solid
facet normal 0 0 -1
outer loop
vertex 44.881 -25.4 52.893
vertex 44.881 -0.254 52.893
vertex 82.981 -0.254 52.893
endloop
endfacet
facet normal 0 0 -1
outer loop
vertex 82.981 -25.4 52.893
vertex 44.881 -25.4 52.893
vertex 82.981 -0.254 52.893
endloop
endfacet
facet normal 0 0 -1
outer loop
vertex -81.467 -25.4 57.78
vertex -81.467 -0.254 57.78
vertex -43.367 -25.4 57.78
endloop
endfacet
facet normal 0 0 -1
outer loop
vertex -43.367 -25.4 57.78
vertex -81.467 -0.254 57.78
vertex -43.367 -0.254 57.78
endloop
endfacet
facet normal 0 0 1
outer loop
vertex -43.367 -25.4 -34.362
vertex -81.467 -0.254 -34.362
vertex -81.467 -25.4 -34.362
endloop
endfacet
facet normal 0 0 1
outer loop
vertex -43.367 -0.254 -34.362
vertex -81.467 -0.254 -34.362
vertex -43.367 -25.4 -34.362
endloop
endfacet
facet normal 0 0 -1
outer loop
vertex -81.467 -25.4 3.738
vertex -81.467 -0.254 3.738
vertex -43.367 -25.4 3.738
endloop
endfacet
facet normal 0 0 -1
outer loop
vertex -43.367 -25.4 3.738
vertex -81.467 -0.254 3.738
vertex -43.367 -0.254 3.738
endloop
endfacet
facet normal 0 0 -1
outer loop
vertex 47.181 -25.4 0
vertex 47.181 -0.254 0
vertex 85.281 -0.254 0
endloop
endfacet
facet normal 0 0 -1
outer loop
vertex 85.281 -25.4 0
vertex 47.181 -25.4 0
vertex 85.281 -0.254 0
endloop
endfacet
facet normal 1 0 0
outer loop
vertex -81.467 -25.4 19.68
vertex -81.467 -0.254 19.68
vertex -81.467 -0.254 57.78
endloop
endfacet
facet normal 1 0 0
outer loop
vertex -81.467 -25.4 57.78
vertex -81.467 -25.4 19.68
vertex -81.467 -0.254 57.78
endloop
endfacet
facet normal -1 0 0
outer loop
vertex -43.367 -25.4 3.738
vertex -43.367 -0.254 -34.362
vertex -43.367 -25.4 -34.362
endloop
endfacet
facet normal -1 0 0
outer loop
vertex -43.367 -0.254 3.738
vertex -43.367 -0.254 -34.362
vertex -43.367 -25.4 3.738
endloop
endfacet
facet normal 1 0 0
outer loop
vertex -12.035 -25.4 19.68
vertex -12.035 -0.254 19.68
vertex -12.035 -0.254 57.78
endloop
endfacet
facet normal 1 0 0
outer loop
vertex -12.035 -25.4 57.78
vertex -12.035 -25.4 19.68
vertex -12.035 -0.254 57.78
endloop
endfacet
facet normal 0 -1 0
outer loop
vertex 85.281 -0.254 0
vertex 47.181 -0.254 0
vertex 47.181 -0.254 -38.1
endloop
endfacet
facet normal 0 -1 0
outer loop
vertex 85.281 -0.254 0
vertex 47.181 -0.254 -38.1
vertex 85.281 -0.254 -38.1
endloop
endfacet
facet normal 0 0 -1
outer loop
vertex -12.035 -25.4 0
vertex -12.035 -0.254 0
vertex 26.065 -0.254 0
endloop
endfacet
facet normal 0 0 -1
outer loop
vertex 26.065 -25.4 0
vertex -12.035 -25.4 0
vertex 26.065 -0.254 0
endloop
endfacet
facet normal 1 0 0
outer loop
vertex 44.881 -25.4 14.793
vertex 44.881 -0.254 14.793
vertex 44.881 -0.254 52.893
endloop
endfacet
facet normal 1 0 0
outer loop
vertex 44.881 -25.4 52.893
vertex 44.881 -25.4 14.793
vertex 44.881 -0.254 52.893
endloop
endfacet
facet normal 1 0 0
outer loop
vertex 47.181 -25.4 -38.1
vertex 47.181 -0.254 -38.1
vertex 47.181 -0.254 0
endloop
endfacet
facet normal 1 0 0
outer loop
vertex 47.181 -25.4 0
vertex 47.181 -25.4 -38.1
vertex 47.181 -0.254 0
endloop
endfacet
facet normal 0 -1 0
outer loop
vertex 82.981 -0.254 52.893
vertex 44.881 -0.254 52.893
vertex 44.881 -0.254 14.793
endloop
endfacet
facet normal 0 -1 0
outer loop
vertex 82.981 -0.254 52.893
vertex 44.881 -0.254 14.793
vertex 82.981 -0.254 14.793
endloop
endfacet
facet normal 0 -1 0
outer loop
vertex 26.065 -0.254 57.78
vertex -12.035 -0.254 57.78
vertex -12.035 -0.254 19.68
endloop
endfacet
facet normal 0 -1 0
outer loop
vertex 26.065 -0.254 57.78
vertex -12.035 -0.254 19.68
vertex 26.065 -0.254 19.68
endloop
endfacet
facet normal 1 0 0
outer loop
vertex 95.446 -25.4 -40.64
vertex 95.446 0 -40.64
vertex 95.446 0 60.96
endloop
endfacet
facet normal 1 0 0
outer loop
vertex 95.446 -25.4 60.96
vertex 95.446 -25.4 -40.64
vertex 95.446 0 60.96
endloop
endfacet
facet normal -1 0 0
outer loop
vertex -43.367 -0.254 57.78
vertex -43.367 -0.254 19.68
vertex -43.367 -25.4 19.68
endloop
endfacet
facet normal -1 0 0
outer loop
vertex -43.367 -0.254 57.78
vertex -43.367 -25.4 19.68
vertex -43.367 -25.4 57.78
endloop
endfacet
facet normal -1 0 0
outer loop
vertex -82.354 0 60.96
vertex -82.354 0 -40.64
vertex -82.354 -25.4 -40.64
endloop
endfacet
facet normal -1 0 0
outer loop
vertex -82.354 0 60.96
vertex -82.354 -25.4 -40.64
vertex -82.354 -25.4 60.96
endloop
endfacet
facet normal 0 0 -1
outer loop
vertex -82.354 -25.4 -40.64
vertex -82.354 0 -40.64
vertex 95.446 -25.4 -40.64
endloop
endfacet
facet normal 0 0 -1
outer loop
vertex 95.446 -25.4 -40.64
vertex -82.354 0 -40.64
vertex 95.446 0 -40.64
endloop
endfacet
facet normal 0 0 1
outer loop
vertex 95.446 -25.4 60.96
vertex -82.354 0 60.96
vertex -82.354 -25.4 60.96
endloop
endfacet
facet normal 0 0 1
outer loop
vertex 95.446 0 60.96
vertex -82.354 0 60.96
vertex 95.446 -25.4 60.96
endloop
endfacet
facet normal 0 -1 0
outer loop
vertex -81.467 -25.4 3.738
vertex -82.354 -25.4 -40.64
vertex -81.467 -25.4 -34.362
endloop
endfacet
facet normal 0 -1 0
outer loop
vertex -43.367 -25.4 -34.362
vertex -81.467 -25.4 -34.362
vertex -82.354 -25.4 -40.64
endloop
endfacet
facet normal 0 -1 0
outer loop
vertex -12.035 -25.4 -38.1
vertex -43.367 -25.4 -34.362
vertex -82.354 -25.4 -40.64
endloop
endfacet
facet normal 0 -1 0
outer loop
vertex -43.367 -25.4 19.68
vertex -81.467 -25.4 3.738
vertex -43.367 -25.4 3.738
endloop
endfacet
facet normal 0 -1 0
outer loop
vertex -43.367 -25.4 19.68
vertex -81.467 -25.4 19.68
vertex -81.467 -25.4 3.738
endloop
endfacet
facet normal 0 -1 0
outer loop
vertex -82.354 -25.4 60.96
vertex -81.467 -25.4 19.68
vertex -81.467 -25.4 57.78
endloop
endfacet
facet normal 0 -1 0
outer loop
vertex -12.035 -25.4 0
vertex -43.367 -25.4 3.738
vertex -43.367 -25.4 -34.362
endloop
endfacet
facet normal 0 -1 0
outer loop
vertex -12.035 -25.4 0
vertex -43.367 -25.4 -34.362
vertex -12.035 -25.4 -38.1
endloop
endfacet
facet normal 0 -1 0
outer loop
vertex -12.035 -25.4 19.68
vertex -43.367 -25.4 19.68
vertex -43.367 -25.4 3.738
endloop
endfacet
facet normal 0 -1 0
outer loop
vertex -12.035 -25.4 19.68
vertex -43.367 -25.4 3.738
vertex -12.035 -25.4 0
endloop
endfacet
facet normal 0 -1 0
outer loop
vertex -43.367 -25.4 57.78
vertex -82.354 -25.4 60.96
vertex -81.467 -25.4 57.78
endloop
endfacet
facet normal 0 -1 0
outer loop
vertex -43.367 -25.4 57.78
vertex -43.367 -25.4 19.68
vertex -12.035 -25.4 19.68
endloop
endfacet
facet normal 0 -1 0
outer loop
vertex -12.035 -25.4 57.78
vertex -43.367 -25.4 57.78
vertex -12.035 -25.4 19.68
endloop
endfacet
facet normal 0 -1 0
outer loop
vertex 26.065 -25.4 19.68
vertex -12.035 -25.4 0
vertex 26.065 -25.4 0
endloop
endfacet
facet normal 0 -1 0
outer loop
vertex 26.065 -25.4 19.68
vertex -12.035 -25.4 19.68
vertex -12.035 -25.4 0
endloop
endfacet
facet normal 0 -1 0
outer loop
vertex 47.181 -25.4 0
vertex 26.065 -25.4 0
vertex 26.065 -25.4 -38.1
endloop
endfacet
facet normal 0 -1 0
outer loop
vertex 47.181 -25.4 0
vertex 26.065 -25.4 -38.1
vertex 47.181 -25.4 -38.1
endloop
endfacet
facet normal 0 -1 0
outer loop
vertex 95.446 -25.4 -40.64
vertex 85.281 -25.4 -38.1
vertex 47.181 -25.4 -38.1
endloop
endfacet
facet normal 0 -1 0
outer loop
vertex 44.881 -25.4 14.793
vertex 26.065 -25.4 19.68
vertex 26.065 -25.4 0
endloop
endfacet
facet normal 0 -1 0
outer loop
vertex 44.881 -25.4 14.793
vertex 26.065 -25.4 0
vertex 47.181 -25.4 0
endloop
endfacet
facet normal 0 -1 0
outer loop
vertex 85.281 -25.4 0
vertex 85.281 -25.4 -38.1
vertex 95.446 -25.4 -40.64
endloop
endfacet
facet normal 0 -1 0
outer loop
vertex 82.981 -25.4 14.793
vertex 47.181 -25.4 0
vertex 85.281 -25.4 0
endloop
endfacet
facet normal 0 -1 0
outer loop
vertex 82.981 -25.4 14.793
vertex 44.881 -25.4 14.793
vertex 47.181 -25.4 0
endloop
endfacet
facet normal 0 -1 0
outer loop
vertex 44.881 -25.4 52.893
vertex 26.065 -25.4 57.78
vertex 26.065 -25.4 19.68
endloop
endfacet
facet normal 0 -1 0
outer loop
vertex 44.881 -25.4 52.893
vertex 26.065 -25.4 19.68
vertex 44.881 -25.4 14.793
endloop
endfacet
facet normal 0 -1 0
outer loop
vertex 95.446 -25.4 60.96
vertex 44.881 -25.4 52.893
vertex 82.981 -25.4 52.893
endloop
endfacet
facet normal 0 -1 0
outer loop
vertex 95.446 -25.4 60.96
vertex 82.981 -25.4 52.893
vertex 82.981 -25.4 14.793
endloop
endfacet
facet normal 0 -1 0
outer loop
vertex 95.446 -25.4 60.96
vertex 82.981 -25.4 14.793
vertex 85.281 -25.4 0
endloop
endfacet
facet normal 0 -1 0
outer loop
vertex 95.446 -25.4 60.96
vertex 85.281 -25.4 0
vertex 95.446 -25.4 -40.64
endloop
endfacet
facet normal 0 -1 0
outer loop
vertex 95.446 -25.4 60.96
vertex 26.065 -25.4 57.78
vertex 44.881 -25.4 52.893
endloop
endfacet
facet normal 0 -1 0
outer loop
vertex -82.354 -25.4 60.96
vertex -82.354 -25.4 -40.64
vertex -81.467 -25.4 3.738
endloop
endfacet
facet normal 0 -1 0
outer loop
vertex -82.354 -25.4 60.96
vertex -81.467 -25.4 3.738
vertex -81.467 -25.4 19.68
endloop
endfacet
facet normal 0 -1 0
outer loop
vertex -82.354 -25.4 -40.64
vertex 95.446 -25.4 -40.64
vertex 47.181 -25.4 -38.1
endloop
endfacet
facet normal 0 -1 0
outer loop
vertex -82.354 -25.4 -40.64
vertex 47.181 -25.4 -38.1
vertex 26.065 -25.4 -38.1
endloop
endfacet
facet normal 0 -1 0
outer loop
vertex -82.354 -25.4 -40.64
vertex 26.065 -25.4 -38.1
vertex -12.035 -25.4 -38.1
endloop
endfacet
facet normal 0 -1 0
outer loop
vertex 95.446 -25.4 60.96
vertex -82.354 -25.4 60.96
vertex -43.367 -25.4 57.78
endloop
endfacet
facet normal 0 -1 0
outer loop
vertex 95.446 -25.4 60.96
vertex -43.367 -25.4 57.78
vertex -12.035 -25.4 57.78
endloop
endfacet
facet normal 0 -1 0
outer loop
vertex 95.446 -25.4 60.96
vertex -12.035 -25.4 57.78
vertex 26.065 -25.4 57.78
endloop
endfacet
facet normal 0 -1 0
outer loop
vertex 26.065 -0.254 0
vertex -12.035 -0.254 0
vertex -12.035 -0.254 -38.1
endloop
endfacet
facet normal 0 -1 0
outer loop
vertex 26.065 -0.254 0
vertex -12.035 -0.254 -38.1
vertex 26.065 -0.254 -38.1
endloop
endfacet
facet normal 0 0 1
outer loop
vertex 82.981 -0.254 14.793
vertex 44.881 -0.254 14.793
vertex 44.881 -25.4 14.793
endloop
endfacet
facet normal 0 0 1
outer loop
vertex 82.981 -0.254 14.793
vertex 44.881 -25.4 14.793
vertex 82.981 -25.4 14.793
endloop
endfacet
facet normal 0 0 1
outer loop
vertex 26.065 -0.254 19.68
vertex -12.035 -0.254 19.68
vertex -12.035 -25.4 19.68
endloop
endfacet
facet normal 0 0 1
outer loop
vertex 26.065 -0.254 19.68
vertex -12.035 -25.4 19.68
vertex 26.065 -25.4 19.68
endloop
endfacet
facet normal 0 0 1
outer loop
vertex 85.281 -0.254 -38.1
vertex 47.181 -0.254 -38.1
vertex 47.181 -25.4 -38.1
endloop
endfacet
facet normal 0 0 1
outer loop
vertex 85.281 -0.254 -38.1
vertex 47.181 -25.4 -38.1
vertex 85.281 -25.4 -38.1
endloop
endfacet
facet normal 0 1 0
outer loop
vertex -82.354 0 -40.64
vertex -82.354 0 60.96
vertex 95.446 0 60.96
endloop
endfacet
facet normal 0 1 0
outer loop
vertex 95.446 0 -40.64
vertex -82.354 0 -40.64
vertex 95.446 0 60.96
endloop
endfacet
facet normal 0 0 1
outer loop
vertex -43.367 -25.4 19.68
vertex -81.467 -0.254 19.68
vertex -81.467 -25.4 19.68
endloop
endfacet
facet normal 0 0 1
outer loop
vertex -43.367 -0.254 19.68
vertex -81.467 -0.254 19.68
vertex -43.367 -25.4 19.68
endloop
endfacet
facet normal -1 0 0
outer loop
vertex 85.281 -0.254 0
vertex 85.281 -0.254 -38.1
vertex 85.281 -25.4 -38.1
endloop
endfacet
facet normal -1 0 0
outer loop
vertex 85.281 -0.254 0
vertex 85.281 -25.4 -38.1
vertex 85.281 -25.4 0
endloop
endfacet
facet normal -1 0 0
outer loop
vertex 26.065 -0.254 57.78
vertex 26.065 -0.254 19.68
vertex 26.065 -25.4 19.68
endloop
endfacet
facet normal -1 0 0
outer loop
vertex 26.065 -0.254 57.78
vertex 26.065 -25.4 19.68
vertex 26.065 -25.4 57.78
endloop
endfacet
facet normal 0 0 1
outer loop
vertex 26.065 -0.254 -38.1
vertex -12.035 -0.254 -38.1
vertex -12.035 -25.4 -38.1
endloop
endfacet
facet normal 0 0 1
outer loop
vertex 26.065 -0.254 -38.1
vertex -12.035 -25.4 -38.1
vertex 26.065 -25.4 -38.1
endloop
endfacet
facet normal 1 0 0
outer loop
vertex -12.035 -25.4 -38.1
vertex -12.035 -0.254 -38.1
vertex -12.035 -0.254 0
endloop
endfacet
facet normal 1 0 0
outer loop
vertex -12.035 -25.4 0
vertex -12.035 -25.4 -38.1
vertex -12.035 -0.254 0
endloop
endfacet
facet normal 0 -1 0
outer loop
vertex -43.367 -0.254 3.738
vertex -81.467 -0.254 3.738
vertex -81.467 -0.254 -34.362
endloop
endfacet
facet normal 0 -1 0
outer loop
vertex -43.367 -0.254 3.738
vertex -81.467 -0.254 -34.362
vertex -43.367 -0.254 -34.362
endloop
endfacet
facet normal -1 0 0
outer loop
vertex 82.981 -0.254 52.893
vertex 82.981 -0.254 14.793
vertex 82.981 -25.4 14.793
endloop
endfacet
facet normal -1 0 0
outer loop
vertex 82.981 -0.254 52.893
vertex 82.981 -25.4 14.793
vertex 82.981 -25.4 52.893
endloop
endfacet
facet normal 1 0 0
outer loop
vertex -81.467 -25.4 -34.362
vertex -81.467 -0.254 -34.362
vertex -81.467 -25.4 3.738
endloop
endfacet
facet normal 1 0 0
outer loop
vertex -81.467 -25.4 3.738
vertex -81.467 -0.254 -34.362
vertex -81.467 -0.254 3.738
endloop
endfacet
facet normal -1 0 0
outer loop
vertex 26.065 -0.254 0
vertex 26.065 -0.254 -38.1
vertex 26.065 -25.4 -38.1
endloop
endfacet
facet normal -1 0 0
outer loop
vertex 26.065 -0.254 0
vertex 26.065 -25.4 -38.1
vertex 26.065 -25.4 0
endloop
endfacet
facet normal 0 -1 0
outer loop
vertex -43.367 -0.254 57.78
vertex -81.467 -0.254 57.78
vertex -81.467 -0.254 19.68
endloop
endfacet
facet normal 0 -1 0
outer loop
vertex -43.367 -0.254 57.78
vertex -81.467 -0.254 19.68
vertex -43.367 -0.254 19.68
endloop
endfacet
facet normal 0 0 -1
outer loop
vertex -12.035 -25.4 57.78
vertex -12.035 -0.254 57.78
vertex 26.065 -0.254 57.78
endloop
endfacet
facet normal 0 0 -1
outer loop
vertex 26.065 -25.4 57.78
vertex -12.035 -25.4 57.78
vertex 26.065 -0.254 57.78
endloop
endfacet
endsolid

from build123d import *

# Parameters (mm, degrees)
F0_W     = 177.8
F0_H     = 101.6
F0_W_2   = 38.1
F0_H_2   = 38.1
F1_DEPTH = 25.4
F2_DEPTH = 0.254


with BuildPart() as f1:
    # F0 (on Front) → F1 (new body)
    with BuildSketch(Plane.XZ):
        with Locations((6.545865, 10.16)):
            Rectangle(F0_W, F0_H)
        with Locations((-62.417315, -15.311638)):
            Rectangle(F0_W_2, F0_H_2, mode=Mode.SUBTRACT)
        with Locations((7.015266, -19.05)):
            Rectangle(F0_W_2, F0_H_2, mode=Mode.SUBTRACT)
        with Locations((66.230962, -19.05)):
            Rectangle(F0_W_2, F0_H_2, mode=Mode.SUBTRACT)
        with Locations((-62.417315, 38.729876)):
            Rectangle(F0_W_2, F0_H_2, mode=Mode.SUBTRACT)
        with Locations((63.931333, 33.843145)):
            Rectangle(F0_W_2, F0_H_2, mode=Mode.SUBTRACT)
        with Locations((7.015266, 38.729876)):
            Rectangle(F0_W_2, F0_H_2, mode=Mode.SUBTRACT)
    extrude(amount=F1_DEPTH)

    # F0 (on Front) → F2 (join)
    with BuildSketch(Plane.XZ):
        with Locations((-62.417315, 38.729876)):
            Rectangle(F0_W_2, F0_H_2)
        with Locations((7.015266, 38.729876)):
            Rectangle(F0_W_2, F0_H_2)
        with Locations((63.931333, 33.843145)):
            Rectangle(F0_W_2, F0_H_2)
        with Locations((66.230962, -19.05)):
            Rectangle(F0_W_2, F0_H_2)
        with Locations((7.015266, -19.05)):
            Rectangle(F0_W_2, F0_H_2)
        with Locations((-62.417315, -15.311638)):
            Rectangle(F0_W_2, F0_H_2)
    extrude(amount=F2_DEPTH)


solid = f1.part
